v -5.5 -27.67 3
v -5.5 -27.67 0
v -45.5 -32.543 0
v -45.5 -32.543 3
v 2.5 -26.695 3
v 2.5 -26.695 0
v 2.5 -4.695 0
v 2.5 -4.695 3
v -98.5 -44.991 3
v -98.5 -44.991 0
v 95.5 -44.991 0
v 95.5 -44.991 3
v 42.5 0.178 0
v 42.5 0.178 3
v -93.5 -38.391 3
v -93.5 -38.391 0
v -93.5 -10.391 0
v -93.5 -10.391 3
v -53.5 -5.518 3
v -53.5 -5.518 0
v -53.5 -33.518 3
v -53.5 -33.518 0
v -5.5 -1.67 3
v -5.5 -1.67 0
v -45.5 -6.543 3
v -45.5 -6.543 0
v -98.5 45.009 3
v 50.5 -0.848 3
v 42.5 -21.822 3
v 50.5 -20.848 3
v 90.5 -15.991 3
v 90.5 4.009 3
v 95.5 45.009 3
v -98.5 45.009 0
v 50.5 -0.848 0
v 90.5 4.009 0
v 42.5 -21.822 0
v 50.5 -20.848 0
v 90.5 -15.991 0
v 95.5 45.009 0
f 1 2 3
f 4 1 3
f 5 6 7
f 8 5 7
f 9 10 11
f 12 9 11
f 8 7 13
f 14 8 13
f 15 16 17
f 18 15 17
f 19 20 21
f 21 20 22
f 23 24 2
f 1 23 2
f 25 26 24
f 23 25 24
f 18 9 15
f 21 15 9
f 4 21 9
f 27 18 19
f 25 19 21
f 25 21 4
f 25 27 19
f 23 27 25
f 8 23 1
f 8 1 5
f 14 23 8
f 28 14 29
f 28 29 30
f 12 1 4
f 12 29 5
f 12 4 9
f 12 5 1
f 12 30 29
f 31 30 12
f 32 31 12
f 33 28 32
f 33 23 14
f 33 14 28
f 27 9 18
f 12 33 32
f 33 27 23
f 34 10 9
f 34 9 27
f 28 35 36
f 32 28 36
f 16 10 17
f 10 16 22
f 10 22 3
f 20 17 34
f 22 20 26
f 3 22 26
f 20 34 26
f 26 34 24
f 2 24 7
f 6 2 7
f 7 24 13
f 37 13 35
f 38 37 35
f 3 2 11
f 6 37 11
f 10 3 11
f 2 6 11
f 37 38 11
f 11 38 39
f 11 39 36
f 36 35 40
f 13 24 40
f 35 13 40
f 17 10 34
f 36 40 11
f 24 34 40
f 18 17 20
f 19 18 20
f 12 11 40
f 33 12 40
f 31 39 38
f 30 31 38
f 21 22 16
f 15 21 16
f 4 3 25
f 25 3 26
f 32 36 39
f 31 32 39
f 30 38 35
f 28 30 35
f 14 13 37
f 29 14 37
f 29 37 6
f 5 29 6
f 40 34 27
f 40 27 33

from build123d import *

# Parameters (mm, degrees)
SKETCH_1_W      = 194
SKETCH_1_H      = 90
EXTRUDE_1_DEPTH = 3


with BuildPart() as part:
    # 草圖1 → 填料-伸長1 (new body)
    with BuildSketch(Plane.XY):
        with Locations((-1.5, 0.009137056)):
            Rectangle(SKETCH_1_W, SKETCH_1_H)
        Polygon((50.5, -20.847715736), (50.5, -0.847715736), (90.5, 4.009137056), (90.5, -15.990862944), align=None, mode=Mode.SUBTRACT)
        Polygon((2.5, -26.695431472), (2.5, -4.695431472), (42.5, 0.177664975), (42.5, -21.822335025), align=None, mode=Mode.SUBTRACT)
        Polygon((-45.5, -32.543147208), (-45.5, -6.543147208), (-5.5, -1.670050761), (-5.5, -27.670050761), align=None, mode=Mode.SUBTRACT)
        Polygon((-93.5, -38.390862944), (-93.5, -10.390862944), (-53.5, -5.517766497), (-53.5, -33.517766497), align=None, mode=Mode.SUBTRACT)
    extrude(amount=EXTRUDE_1_DEPTH)


solid = part.part
